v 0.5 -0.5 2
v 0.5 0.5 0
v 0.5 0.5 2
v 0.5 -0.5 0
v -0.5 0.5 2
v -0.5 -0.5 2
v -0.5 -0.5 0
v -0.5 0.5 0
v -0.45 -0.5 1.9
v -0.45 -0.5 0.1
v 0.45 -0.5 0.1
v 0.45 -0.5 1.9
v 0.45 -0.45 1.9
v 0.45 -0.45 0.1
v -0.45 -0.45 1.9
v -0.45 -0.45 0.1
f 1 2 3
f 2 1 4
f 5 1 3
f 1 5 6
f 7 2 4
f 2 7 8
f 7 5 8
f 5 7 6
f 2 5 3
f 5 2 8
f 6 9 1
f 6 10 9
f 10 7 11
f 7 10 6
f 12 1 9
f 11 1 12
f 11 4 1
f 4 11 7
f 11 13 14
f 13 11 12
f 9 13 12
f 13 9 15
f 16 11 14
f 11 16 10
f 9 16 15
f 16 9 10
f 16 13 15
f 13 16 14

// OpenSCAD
// file: lib.scad
function x(v) = v[0];
function y(v) = v[1];
function z(v) = v[2];
function add(v1,v2) = [ for (i = [ 0 : len(v1)-1 ]) v1[i] + v2[i] ];
function xv(d) = [d,0,0];
function yv(d) = [0,d,0];
function zv(d) = [0,0,d];

module box(v) { cube(size=v, center=true); }
module cyl(r1,r2,h) { cylinder(r1=r1, r2=r2, h=h, center=true); }

function grow(n,v) = [x(v)+n*2, y(v)+n*2, z(v)+n*2];

module rbox(v, radius=1) {
	cx = x(v)/2-radius;
	cy = y(v)/2-radius;
	cz = z(v)/2-radius;

	hull() {
		translate([cx,cy,cz]) sphere(r=radius);
		translate([cx,cy,-cz]) sphere(r=radius);
		translate([cx,-cy,cz]) sphere(r=radius);
		translate([cx,-cy,-cz]) sphere(r=radius);
		translate([-cx,cy,cz]) sphere(r=radius);
		translate([-cx,cy,-cz]) sphere(r=radius);
		translate([-cx,-cy,cz]) sphere(r=radius);
		translate([-cx,-cy,-cz]) sphere(r=radius);
	}
}

module fillet(r=1) {
  minkowski() {
    difference() {
      children();
      minkowski() {
        difference() {
          minkowski() {
            children();
            sphere(r=r);
          }
          children();
        }
        sphere(r=r);
      }
    }
    sphere(r=r);
  }
}
// main file
use <lib.scad>

module rack() {
	translate([0,0,1.0]) difference() {
		box([1.0, 1.0, 2.0]);
		translate([0,-0.9,0]) box([0.9, 0.9, 1.8]);
	}
}

rack($fn=36);
